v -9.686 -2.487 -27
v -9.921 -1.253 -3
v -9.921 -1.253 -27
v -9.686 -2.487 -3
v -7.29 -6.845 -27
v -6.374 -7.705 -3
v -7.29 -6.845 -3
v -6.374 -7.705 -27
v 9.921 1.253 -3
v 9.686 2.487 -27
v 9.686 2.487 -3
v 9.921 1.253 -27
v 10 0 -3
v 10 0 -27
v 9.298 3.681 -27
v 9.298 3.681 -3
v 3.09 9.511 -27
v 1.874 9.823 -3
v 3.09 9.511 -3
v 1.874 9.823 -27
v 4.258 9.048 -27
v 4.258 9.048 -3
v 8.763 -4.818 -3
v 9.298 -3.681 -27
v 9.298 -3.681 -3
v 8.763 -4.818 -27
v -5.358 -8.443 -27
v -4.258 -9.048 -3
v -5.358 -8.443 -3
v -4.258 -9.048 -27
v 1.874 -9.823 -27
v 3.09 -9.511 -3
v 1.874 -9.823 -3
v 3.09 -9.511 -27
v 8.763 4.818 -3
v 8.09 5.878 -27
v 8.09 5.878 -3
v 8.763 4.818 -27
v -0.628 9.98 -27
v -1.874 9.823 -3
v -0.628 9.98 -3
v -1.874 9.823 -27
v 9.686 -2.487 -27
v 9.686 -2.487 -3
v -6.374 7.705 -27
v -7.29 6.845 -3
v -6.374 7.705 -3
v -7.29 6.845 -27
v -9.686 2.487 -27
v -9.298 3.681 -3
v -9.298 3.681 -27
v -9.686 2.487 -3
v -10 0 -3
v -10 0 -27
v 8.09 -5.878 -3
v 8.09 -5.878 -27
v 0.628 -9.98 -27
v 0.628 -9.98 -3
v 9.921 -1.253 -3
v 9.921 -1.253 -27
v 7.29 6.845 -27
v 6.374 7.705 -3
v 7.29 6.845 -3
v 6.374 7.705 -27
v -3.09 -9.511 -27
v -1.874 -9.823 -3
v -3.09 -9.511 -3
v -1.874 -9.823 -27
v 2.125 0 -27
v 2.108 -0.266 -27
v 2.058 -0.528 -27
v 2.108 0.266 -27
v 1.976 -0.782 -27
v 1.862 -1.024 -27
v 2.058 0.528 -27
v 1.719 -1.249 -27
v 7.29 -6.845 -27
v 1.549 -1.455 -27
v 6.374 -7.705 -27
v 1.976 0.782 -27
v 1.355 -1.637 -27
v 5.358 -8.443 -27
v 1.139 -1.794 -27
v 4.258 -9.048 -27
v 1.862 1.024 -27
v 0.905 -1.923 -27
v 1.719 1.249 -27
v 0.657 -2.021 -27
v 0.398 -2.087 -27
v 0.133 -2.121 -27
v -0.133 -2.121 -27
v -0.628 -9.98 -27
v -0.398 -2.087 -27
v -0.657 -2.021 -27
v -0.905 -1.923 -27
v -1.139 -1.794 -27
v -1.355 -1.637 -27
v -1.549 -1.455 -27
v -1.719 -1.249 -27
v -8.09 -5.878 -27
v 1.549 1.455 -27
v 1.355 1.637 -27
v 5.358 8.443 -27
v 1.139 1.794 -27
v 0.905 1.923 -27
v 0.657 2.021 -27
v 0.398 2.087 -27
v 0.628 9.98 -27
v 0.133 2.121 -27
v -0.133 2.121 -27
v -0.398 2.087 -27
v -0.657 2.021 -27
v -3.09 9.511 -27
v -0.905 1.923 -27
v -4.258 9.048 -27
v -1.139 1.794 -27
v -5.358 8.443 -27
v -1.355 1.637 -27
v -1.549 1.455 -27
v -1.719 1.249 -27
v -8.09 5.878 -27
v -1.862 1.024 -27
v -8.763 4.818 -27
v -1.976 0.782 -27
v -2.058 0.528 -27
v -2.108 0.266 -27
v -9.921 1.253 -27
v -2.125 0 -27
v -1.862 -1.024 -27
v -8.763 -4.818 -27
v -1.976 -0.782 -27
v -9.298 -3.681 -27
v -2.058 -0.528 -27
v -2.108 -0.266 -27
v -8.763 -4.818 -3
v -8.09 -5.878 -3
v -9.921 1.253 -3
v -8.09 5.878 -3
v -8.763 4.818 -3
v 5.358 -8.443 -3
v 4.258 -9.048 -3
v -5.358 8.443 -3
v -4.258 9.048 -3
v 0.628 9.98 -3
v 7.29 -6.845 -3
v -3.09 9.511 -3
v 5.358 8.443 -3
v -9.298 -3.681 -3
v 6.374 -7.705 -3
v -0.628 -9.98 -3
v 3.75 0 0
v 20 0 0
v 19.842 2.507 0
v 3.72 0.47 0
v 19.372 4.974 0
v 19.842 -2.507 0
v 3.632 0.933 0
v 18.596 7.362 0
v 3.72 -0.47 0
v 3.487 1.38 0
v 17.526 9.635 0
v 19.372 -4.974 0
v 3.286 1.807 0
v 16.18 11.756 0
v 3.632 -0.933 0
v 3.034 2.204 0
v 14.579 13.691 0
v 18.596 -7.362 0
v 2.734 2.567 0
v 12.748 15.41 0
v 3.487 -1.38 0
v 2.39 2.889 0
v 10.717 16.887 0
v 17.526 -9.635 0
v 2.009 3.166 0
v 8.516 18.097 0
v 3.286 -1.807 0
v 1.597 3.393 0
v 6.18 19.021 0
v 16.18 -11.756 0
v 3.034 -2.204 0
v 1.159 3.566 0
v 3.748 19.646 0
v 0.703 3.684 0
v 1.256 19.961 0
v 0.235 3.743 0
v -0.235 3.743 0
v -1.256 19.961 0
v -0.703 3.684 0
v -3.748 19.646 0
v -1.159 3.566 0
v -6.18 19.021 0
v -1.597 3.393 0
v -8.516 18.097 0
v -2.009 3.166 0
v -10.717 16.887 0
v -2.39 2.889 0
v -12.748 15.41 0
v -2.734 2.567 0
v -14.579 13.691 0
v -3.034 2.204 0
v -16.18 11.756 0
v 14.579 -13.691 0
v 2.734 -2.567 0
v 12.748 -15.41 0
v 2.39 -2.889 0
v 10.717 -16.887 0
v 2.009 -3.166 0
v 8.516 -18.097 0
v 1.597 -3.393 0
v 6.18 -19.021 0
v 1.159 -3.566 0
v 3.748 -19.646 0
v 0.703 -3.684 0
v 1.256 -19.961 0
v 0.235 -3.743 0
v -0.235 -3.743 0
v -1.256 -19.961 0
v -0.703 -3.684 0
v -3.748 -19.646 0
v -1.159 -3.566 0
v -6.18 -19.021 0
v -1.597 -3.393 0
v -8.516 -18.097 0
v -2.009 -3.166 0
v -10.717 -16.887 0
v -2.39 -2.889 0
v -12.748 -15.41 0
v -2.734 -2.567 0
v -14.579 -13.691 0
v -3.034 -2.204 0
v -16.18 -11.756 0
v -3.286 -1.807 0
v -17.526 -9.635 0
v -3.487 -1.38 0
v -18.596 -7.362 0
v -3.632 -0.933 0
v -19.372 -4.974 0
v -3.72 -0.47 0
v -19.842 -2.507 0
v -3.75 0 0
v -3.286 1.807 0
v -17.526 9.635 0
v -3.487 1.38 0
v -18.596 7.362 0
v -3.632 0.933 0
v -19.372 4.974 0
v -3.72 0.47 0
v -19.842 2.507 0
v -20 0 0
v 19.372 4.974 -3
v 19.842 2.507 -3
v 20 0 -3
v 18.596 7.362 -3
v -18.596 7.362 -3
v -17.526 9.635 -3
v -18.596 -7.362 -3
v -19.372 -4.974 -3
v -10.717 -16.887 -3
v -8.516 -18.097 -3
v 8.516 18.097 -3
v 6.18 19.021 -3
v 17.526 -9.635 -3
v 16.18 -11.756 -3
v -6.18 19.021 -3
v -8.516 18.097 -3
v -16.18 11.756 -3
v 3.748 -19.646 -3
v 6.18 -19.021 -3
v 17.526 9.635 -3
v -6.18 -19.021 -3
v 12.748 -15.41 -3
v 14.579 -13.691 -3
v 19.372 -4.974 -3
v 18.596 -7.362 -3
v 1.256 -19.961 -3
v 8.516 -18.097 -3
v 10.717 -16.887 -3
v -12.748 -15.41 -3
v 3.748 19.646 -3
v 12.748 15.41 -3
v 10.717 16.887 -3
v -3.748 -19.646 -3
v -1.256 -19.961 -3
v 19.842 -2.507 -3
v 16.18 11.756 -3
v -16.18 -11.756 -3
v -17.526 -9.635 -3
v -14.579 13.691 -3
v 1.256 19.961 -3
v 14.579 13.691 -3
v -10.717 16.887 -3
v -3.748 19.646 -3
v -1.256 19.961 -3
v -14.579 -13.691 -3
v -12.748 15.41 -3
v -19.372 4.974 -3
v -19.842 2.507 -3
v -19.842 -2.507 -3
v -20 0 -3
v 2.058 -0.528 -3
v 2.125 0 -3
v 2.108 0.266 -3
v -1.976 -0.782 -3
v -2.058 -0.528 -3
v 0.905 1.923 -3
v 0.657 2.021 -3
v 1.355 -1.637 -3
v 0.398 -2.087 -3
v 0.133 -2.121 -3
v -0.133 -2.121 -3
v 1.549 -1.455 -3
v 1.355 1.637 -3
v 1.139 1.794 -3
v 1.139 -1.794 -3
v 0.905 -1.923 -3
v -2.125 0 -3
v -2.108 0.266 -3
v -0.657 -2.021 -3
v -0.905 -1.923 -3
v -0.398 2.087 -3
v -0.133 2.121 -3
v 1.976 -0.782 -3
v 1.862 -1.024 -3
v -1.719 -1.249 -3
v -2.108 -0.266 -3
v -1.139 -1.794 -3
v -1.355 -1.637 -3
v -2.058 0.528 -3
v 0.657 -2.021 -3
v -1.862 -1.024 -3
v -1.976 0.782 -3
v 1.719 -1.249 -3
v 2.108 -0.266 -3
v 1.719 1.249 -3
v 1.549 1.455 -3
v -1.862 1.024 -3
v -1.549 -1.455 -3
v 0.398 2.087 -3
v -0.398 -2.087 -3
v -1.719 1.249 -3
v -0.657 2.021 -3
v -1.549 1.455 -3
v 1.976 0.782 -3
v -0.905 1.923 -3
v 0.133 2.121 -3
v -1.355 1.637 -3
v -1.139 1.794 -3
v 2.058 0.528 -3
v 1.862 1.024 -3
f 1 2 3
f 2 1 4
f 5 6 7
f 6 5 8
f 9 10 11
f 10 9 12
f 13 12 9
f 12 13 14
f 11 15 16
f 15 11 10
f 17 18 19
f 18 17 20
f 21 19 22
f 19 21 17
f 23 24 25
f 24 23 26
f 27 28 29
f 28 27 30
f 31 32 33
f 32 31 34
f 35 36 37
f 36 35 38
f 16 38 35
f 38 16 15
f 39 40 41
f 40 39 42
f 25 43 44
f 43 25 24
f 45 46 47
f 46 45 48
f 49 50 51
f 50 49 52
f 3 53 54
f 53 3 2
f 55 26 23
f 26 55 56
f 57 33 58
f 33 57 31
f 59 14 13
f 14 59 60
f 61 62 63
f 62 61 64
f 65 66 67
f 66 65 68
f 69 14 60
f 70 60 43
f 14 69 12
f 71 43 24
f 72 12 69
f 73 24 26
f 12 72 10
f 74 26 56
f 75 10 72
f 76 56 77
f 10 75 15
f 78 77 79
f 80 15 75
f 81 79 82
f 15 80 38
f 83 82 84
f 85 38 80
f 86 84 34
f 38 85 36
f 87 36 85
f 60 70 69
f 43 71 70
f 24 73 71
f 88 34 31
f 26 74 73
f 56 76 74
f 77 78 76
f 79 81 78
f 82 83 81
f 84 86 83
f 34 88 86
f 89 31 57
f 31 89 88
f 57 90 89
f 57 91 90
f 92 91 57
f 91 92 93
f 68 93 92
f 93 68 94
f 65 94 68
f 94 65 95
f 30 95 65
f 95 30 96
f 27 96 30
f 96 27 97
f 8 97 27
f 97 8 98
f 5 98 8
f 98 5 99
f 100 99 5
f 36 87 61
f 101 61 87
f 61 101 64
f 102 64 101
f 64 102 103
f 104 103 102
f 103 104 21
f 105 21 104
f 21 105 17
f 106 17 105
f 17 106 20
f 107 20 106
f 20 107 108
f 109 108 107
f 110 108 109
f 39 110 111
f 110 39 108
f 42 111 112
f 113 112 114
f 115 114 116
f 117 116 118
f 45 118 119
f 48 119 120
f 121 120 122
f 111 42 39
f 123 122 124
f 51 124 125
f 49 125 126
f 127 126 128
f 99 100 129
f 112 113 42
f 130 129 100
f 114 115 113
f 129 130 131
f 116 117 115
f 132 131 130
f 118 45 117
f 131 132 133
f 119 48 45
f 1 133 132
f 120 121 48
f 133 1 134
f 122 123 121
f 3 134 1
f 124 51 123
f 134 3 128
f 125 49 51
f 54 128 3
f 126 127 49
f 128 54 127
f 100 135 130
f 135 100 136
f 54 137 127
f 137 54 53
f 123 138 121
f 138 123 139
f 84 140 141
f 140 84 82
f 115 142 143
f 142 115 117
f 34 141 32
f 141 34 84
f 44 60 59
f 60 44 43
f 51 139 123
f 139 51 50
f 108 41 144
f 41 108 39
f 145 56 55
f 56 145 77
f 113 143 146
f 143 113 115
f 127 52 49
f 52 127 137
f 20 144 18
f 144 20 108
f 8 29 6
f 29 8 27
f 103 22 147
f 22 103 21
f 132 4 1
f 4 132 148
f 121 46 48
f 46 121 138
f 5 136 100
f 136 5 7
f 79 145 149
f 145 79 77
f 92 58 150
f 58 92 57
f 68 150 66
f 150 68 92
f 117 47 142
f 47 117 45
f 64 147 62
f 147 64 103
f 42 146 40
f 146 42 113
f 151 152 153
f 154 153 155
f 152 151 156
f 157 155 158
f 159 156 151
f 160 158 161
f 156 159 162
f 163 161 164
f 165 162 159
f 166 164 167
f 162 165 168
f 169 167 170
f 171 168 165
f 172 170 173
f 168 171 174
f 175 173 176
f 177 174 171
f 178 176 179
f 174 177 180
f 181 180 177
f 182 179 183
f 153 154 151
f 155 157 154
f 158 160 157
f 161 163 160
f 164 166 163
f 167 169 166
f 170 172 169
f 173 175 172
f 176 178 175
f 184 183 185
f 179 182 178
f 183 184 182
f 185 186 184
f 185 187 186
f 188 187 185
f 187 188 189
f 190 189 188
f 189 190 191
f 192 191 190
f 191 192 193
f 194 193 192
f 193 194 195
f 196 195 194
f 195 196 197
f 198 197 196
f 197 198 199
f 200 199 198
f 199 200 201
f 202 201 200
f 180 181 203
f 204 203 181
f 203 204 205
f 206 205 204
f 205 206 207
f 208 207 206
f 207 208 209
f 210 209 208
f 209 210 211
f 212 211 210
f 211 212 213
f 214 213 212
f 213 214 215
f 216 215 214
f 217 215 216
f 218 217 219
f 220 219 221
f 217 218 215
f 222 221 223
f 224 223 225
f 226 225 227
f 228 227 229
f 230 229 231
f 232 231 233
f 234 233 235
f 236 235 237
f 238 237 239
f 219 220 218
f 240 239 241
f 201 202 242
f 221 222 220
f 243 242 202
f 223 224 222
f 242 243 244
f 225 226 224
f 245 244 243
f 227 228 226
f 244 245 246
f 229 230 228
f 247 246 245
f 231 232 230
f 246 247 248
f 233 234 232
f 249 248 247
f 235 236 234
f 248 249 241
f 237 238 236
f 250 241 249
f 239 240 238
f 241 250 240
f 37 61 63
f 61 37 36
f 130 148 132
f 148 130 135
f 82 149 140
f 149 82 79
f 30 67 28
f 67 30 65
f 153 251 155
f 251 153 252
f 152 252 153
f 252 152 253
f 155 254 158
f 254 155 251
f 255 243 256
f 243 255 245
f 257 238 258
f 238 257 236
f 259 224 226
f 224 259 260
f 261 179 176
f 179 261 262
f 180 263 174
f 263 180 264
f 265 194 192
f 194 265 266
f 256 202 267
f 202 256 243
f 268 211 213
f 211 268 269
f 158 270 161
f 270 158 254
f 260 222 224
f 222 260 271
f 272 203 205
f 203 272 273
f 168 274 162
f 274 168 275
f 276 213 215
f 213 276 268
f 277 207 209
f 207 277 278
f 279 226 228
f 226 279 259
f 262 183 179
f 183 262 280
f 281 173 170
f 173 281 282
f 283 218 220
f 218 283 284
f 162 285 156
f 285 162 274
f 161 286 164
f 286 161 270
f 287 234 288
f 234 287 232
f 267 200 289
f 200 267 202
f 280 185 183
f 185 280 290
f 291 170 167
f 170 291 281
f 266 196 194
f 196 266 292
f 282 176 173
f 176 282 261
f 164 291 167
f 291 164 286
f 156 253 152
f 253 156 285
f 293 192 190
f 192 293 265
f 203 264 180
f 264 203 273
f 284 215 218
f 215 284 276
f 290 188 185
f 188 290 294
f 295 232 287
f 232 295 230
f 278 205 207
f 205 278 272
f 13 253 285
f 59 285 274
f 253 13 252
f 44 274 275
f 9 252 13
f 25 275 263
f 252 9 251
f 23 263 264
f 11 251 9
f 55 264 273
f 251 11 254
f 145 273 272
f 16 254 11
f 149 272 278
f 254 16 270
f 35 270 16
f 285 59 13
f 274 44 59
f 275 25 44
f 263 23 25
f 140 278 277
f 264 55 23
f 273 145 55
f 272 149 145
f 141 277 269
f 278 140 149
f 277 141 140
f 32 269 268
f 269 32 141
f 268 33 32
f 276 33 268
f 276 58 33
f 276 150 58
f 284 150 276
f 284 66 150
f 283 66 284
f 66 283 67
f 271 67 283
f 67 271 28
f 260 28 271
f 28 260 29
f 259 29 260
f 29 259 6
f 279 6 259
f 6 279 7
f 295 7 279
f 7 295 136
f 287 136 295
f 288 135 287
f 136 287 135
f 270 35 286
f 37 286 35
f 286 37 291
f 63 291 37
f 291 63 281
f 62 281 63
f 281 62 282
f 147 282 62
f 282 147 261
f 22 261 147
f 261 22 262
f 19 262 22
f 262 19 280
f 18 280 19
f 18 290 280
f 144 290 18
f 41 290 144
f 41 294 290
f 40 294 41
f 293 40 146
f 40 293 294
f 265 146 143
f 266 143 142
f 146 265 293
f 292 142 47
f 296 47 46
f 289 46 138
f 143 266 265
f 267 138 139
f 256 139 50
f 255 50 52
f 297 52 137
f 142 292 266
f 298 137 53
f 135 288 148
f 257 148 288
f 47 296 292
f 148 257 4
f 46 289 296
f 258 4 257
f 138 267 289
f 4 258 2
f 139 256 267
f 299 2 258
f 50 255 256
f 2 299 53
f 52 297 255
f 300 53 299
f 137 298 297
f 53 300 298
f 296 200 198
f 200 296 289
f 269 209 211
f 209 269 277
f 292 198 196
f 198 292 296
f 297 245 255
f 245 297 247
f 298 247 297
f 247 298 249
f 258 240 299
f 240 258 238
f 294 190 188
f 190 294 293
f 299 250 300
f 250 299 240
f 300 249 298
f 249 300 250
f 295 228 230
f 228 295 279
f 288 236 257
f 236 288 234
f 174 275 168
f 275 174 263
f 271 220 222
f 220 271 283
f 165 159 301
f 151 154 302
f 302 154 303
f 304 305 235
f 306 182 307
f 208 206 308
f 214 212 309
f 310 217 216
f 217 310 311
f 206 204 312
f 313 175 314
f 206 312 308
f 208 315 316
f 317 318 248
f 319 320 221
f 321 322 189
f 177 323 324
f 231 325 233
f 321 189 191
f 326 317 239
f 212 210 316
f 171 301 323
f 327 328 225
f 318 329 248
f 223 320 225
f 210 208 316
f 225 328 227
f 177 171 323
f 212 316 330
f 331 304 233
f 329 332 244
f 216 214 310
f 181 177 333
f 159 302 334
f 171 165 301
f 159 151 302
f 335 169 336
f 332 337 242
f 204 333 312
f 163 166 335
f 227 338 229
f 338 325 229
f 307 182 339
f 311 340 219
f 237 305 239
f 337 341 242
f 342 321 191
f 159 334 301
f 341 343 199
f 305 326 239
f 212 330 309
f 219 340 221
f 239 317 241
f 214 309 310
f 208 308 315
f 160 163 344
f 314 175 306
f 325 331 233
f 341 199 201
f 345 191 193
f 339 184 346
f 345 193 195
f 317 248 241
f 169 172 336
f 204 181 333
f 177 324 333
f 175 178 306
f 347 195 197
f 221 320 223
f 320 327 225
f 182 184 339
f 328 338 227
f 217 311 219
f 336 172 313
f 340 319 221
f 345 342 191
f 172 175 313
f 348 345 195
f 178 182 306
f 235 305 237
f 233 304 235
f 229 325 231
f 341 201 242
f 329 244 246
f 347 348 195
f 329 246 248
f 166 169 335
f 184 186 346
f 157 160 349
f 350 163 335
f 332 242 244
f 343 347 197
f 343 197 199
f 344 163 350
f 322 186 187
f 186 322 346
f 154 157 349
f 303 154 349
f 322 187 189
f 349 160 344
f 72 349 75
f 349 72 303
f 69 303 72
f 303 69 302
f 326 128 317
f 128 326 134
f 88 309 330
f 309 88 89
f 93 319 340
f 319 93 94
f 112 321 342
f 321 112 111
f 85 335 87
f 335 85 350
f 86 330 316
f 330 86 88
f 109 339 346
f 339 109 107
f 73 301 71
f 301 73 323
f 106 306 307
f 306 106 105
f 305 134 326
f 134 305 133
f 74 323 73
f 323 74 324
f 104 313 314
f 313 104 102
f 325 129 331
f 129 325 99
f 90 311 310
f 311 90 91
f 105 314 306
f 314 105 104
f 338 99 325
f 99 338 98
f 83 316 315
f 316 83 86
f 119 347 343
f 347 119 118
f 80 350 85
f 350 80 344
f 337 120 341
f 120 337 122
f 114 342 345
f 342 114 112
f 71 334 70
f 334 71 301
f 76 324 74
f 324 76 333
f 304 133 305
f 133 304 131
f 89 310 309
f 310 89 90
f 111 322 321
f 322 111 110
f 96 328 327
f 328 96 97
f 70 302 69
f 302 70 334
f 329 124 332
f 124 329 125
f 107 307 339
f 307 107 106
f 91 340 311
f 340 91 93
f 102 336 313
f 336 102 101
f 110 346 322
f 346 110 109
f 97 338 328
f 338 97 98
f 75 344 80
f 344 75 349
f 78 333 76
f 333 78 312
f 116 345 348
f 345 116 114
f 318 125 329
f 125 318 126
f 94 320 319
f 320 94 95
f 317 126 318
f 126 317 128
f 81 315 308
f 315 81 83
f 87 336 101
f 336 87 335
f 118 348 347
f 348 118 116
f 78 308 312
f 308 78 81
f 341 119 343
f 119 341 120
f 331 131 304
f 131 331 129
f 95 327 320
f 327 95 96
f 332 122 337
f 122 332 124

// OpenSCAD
$fn = 50;


difference() {
	union() {
		translate(v = [0, 0, -27.0000000000]) {
			cylinder(h = 27, r = 10.0000000000);
		}
		translate(v = [0, 0, -3.0000000000]) {
			cylinder(h = 3, r = 20.0000000000);
		}
	}
	union() {
		translate(v = [0, 0, 0]) {
			rotate(a = [0, 0, 0]) {
				difference() {
					union() {
						#translate(v = [0, 0, -27.0000000000]) {
							cylinder(h = 27, r = 2.0000000000);
						}
						#translate(v = [0, 0, -3]) {
							cylinder(h = 3, r = 10.0000000000, r1 = 2.1250000000, r2 = 3.7500000000);
						}
						#translate(v = [0, 0, -27.0000000000]) {
							cylinder(h = 27, r = 2.1250000000);
						}
						#translate(v = [0, 0, -27.0000000000]) {
							cylinder(h = 27, r = 2.0000000000);
						}
					}
					union();
				}
			}
		}
	}
}
